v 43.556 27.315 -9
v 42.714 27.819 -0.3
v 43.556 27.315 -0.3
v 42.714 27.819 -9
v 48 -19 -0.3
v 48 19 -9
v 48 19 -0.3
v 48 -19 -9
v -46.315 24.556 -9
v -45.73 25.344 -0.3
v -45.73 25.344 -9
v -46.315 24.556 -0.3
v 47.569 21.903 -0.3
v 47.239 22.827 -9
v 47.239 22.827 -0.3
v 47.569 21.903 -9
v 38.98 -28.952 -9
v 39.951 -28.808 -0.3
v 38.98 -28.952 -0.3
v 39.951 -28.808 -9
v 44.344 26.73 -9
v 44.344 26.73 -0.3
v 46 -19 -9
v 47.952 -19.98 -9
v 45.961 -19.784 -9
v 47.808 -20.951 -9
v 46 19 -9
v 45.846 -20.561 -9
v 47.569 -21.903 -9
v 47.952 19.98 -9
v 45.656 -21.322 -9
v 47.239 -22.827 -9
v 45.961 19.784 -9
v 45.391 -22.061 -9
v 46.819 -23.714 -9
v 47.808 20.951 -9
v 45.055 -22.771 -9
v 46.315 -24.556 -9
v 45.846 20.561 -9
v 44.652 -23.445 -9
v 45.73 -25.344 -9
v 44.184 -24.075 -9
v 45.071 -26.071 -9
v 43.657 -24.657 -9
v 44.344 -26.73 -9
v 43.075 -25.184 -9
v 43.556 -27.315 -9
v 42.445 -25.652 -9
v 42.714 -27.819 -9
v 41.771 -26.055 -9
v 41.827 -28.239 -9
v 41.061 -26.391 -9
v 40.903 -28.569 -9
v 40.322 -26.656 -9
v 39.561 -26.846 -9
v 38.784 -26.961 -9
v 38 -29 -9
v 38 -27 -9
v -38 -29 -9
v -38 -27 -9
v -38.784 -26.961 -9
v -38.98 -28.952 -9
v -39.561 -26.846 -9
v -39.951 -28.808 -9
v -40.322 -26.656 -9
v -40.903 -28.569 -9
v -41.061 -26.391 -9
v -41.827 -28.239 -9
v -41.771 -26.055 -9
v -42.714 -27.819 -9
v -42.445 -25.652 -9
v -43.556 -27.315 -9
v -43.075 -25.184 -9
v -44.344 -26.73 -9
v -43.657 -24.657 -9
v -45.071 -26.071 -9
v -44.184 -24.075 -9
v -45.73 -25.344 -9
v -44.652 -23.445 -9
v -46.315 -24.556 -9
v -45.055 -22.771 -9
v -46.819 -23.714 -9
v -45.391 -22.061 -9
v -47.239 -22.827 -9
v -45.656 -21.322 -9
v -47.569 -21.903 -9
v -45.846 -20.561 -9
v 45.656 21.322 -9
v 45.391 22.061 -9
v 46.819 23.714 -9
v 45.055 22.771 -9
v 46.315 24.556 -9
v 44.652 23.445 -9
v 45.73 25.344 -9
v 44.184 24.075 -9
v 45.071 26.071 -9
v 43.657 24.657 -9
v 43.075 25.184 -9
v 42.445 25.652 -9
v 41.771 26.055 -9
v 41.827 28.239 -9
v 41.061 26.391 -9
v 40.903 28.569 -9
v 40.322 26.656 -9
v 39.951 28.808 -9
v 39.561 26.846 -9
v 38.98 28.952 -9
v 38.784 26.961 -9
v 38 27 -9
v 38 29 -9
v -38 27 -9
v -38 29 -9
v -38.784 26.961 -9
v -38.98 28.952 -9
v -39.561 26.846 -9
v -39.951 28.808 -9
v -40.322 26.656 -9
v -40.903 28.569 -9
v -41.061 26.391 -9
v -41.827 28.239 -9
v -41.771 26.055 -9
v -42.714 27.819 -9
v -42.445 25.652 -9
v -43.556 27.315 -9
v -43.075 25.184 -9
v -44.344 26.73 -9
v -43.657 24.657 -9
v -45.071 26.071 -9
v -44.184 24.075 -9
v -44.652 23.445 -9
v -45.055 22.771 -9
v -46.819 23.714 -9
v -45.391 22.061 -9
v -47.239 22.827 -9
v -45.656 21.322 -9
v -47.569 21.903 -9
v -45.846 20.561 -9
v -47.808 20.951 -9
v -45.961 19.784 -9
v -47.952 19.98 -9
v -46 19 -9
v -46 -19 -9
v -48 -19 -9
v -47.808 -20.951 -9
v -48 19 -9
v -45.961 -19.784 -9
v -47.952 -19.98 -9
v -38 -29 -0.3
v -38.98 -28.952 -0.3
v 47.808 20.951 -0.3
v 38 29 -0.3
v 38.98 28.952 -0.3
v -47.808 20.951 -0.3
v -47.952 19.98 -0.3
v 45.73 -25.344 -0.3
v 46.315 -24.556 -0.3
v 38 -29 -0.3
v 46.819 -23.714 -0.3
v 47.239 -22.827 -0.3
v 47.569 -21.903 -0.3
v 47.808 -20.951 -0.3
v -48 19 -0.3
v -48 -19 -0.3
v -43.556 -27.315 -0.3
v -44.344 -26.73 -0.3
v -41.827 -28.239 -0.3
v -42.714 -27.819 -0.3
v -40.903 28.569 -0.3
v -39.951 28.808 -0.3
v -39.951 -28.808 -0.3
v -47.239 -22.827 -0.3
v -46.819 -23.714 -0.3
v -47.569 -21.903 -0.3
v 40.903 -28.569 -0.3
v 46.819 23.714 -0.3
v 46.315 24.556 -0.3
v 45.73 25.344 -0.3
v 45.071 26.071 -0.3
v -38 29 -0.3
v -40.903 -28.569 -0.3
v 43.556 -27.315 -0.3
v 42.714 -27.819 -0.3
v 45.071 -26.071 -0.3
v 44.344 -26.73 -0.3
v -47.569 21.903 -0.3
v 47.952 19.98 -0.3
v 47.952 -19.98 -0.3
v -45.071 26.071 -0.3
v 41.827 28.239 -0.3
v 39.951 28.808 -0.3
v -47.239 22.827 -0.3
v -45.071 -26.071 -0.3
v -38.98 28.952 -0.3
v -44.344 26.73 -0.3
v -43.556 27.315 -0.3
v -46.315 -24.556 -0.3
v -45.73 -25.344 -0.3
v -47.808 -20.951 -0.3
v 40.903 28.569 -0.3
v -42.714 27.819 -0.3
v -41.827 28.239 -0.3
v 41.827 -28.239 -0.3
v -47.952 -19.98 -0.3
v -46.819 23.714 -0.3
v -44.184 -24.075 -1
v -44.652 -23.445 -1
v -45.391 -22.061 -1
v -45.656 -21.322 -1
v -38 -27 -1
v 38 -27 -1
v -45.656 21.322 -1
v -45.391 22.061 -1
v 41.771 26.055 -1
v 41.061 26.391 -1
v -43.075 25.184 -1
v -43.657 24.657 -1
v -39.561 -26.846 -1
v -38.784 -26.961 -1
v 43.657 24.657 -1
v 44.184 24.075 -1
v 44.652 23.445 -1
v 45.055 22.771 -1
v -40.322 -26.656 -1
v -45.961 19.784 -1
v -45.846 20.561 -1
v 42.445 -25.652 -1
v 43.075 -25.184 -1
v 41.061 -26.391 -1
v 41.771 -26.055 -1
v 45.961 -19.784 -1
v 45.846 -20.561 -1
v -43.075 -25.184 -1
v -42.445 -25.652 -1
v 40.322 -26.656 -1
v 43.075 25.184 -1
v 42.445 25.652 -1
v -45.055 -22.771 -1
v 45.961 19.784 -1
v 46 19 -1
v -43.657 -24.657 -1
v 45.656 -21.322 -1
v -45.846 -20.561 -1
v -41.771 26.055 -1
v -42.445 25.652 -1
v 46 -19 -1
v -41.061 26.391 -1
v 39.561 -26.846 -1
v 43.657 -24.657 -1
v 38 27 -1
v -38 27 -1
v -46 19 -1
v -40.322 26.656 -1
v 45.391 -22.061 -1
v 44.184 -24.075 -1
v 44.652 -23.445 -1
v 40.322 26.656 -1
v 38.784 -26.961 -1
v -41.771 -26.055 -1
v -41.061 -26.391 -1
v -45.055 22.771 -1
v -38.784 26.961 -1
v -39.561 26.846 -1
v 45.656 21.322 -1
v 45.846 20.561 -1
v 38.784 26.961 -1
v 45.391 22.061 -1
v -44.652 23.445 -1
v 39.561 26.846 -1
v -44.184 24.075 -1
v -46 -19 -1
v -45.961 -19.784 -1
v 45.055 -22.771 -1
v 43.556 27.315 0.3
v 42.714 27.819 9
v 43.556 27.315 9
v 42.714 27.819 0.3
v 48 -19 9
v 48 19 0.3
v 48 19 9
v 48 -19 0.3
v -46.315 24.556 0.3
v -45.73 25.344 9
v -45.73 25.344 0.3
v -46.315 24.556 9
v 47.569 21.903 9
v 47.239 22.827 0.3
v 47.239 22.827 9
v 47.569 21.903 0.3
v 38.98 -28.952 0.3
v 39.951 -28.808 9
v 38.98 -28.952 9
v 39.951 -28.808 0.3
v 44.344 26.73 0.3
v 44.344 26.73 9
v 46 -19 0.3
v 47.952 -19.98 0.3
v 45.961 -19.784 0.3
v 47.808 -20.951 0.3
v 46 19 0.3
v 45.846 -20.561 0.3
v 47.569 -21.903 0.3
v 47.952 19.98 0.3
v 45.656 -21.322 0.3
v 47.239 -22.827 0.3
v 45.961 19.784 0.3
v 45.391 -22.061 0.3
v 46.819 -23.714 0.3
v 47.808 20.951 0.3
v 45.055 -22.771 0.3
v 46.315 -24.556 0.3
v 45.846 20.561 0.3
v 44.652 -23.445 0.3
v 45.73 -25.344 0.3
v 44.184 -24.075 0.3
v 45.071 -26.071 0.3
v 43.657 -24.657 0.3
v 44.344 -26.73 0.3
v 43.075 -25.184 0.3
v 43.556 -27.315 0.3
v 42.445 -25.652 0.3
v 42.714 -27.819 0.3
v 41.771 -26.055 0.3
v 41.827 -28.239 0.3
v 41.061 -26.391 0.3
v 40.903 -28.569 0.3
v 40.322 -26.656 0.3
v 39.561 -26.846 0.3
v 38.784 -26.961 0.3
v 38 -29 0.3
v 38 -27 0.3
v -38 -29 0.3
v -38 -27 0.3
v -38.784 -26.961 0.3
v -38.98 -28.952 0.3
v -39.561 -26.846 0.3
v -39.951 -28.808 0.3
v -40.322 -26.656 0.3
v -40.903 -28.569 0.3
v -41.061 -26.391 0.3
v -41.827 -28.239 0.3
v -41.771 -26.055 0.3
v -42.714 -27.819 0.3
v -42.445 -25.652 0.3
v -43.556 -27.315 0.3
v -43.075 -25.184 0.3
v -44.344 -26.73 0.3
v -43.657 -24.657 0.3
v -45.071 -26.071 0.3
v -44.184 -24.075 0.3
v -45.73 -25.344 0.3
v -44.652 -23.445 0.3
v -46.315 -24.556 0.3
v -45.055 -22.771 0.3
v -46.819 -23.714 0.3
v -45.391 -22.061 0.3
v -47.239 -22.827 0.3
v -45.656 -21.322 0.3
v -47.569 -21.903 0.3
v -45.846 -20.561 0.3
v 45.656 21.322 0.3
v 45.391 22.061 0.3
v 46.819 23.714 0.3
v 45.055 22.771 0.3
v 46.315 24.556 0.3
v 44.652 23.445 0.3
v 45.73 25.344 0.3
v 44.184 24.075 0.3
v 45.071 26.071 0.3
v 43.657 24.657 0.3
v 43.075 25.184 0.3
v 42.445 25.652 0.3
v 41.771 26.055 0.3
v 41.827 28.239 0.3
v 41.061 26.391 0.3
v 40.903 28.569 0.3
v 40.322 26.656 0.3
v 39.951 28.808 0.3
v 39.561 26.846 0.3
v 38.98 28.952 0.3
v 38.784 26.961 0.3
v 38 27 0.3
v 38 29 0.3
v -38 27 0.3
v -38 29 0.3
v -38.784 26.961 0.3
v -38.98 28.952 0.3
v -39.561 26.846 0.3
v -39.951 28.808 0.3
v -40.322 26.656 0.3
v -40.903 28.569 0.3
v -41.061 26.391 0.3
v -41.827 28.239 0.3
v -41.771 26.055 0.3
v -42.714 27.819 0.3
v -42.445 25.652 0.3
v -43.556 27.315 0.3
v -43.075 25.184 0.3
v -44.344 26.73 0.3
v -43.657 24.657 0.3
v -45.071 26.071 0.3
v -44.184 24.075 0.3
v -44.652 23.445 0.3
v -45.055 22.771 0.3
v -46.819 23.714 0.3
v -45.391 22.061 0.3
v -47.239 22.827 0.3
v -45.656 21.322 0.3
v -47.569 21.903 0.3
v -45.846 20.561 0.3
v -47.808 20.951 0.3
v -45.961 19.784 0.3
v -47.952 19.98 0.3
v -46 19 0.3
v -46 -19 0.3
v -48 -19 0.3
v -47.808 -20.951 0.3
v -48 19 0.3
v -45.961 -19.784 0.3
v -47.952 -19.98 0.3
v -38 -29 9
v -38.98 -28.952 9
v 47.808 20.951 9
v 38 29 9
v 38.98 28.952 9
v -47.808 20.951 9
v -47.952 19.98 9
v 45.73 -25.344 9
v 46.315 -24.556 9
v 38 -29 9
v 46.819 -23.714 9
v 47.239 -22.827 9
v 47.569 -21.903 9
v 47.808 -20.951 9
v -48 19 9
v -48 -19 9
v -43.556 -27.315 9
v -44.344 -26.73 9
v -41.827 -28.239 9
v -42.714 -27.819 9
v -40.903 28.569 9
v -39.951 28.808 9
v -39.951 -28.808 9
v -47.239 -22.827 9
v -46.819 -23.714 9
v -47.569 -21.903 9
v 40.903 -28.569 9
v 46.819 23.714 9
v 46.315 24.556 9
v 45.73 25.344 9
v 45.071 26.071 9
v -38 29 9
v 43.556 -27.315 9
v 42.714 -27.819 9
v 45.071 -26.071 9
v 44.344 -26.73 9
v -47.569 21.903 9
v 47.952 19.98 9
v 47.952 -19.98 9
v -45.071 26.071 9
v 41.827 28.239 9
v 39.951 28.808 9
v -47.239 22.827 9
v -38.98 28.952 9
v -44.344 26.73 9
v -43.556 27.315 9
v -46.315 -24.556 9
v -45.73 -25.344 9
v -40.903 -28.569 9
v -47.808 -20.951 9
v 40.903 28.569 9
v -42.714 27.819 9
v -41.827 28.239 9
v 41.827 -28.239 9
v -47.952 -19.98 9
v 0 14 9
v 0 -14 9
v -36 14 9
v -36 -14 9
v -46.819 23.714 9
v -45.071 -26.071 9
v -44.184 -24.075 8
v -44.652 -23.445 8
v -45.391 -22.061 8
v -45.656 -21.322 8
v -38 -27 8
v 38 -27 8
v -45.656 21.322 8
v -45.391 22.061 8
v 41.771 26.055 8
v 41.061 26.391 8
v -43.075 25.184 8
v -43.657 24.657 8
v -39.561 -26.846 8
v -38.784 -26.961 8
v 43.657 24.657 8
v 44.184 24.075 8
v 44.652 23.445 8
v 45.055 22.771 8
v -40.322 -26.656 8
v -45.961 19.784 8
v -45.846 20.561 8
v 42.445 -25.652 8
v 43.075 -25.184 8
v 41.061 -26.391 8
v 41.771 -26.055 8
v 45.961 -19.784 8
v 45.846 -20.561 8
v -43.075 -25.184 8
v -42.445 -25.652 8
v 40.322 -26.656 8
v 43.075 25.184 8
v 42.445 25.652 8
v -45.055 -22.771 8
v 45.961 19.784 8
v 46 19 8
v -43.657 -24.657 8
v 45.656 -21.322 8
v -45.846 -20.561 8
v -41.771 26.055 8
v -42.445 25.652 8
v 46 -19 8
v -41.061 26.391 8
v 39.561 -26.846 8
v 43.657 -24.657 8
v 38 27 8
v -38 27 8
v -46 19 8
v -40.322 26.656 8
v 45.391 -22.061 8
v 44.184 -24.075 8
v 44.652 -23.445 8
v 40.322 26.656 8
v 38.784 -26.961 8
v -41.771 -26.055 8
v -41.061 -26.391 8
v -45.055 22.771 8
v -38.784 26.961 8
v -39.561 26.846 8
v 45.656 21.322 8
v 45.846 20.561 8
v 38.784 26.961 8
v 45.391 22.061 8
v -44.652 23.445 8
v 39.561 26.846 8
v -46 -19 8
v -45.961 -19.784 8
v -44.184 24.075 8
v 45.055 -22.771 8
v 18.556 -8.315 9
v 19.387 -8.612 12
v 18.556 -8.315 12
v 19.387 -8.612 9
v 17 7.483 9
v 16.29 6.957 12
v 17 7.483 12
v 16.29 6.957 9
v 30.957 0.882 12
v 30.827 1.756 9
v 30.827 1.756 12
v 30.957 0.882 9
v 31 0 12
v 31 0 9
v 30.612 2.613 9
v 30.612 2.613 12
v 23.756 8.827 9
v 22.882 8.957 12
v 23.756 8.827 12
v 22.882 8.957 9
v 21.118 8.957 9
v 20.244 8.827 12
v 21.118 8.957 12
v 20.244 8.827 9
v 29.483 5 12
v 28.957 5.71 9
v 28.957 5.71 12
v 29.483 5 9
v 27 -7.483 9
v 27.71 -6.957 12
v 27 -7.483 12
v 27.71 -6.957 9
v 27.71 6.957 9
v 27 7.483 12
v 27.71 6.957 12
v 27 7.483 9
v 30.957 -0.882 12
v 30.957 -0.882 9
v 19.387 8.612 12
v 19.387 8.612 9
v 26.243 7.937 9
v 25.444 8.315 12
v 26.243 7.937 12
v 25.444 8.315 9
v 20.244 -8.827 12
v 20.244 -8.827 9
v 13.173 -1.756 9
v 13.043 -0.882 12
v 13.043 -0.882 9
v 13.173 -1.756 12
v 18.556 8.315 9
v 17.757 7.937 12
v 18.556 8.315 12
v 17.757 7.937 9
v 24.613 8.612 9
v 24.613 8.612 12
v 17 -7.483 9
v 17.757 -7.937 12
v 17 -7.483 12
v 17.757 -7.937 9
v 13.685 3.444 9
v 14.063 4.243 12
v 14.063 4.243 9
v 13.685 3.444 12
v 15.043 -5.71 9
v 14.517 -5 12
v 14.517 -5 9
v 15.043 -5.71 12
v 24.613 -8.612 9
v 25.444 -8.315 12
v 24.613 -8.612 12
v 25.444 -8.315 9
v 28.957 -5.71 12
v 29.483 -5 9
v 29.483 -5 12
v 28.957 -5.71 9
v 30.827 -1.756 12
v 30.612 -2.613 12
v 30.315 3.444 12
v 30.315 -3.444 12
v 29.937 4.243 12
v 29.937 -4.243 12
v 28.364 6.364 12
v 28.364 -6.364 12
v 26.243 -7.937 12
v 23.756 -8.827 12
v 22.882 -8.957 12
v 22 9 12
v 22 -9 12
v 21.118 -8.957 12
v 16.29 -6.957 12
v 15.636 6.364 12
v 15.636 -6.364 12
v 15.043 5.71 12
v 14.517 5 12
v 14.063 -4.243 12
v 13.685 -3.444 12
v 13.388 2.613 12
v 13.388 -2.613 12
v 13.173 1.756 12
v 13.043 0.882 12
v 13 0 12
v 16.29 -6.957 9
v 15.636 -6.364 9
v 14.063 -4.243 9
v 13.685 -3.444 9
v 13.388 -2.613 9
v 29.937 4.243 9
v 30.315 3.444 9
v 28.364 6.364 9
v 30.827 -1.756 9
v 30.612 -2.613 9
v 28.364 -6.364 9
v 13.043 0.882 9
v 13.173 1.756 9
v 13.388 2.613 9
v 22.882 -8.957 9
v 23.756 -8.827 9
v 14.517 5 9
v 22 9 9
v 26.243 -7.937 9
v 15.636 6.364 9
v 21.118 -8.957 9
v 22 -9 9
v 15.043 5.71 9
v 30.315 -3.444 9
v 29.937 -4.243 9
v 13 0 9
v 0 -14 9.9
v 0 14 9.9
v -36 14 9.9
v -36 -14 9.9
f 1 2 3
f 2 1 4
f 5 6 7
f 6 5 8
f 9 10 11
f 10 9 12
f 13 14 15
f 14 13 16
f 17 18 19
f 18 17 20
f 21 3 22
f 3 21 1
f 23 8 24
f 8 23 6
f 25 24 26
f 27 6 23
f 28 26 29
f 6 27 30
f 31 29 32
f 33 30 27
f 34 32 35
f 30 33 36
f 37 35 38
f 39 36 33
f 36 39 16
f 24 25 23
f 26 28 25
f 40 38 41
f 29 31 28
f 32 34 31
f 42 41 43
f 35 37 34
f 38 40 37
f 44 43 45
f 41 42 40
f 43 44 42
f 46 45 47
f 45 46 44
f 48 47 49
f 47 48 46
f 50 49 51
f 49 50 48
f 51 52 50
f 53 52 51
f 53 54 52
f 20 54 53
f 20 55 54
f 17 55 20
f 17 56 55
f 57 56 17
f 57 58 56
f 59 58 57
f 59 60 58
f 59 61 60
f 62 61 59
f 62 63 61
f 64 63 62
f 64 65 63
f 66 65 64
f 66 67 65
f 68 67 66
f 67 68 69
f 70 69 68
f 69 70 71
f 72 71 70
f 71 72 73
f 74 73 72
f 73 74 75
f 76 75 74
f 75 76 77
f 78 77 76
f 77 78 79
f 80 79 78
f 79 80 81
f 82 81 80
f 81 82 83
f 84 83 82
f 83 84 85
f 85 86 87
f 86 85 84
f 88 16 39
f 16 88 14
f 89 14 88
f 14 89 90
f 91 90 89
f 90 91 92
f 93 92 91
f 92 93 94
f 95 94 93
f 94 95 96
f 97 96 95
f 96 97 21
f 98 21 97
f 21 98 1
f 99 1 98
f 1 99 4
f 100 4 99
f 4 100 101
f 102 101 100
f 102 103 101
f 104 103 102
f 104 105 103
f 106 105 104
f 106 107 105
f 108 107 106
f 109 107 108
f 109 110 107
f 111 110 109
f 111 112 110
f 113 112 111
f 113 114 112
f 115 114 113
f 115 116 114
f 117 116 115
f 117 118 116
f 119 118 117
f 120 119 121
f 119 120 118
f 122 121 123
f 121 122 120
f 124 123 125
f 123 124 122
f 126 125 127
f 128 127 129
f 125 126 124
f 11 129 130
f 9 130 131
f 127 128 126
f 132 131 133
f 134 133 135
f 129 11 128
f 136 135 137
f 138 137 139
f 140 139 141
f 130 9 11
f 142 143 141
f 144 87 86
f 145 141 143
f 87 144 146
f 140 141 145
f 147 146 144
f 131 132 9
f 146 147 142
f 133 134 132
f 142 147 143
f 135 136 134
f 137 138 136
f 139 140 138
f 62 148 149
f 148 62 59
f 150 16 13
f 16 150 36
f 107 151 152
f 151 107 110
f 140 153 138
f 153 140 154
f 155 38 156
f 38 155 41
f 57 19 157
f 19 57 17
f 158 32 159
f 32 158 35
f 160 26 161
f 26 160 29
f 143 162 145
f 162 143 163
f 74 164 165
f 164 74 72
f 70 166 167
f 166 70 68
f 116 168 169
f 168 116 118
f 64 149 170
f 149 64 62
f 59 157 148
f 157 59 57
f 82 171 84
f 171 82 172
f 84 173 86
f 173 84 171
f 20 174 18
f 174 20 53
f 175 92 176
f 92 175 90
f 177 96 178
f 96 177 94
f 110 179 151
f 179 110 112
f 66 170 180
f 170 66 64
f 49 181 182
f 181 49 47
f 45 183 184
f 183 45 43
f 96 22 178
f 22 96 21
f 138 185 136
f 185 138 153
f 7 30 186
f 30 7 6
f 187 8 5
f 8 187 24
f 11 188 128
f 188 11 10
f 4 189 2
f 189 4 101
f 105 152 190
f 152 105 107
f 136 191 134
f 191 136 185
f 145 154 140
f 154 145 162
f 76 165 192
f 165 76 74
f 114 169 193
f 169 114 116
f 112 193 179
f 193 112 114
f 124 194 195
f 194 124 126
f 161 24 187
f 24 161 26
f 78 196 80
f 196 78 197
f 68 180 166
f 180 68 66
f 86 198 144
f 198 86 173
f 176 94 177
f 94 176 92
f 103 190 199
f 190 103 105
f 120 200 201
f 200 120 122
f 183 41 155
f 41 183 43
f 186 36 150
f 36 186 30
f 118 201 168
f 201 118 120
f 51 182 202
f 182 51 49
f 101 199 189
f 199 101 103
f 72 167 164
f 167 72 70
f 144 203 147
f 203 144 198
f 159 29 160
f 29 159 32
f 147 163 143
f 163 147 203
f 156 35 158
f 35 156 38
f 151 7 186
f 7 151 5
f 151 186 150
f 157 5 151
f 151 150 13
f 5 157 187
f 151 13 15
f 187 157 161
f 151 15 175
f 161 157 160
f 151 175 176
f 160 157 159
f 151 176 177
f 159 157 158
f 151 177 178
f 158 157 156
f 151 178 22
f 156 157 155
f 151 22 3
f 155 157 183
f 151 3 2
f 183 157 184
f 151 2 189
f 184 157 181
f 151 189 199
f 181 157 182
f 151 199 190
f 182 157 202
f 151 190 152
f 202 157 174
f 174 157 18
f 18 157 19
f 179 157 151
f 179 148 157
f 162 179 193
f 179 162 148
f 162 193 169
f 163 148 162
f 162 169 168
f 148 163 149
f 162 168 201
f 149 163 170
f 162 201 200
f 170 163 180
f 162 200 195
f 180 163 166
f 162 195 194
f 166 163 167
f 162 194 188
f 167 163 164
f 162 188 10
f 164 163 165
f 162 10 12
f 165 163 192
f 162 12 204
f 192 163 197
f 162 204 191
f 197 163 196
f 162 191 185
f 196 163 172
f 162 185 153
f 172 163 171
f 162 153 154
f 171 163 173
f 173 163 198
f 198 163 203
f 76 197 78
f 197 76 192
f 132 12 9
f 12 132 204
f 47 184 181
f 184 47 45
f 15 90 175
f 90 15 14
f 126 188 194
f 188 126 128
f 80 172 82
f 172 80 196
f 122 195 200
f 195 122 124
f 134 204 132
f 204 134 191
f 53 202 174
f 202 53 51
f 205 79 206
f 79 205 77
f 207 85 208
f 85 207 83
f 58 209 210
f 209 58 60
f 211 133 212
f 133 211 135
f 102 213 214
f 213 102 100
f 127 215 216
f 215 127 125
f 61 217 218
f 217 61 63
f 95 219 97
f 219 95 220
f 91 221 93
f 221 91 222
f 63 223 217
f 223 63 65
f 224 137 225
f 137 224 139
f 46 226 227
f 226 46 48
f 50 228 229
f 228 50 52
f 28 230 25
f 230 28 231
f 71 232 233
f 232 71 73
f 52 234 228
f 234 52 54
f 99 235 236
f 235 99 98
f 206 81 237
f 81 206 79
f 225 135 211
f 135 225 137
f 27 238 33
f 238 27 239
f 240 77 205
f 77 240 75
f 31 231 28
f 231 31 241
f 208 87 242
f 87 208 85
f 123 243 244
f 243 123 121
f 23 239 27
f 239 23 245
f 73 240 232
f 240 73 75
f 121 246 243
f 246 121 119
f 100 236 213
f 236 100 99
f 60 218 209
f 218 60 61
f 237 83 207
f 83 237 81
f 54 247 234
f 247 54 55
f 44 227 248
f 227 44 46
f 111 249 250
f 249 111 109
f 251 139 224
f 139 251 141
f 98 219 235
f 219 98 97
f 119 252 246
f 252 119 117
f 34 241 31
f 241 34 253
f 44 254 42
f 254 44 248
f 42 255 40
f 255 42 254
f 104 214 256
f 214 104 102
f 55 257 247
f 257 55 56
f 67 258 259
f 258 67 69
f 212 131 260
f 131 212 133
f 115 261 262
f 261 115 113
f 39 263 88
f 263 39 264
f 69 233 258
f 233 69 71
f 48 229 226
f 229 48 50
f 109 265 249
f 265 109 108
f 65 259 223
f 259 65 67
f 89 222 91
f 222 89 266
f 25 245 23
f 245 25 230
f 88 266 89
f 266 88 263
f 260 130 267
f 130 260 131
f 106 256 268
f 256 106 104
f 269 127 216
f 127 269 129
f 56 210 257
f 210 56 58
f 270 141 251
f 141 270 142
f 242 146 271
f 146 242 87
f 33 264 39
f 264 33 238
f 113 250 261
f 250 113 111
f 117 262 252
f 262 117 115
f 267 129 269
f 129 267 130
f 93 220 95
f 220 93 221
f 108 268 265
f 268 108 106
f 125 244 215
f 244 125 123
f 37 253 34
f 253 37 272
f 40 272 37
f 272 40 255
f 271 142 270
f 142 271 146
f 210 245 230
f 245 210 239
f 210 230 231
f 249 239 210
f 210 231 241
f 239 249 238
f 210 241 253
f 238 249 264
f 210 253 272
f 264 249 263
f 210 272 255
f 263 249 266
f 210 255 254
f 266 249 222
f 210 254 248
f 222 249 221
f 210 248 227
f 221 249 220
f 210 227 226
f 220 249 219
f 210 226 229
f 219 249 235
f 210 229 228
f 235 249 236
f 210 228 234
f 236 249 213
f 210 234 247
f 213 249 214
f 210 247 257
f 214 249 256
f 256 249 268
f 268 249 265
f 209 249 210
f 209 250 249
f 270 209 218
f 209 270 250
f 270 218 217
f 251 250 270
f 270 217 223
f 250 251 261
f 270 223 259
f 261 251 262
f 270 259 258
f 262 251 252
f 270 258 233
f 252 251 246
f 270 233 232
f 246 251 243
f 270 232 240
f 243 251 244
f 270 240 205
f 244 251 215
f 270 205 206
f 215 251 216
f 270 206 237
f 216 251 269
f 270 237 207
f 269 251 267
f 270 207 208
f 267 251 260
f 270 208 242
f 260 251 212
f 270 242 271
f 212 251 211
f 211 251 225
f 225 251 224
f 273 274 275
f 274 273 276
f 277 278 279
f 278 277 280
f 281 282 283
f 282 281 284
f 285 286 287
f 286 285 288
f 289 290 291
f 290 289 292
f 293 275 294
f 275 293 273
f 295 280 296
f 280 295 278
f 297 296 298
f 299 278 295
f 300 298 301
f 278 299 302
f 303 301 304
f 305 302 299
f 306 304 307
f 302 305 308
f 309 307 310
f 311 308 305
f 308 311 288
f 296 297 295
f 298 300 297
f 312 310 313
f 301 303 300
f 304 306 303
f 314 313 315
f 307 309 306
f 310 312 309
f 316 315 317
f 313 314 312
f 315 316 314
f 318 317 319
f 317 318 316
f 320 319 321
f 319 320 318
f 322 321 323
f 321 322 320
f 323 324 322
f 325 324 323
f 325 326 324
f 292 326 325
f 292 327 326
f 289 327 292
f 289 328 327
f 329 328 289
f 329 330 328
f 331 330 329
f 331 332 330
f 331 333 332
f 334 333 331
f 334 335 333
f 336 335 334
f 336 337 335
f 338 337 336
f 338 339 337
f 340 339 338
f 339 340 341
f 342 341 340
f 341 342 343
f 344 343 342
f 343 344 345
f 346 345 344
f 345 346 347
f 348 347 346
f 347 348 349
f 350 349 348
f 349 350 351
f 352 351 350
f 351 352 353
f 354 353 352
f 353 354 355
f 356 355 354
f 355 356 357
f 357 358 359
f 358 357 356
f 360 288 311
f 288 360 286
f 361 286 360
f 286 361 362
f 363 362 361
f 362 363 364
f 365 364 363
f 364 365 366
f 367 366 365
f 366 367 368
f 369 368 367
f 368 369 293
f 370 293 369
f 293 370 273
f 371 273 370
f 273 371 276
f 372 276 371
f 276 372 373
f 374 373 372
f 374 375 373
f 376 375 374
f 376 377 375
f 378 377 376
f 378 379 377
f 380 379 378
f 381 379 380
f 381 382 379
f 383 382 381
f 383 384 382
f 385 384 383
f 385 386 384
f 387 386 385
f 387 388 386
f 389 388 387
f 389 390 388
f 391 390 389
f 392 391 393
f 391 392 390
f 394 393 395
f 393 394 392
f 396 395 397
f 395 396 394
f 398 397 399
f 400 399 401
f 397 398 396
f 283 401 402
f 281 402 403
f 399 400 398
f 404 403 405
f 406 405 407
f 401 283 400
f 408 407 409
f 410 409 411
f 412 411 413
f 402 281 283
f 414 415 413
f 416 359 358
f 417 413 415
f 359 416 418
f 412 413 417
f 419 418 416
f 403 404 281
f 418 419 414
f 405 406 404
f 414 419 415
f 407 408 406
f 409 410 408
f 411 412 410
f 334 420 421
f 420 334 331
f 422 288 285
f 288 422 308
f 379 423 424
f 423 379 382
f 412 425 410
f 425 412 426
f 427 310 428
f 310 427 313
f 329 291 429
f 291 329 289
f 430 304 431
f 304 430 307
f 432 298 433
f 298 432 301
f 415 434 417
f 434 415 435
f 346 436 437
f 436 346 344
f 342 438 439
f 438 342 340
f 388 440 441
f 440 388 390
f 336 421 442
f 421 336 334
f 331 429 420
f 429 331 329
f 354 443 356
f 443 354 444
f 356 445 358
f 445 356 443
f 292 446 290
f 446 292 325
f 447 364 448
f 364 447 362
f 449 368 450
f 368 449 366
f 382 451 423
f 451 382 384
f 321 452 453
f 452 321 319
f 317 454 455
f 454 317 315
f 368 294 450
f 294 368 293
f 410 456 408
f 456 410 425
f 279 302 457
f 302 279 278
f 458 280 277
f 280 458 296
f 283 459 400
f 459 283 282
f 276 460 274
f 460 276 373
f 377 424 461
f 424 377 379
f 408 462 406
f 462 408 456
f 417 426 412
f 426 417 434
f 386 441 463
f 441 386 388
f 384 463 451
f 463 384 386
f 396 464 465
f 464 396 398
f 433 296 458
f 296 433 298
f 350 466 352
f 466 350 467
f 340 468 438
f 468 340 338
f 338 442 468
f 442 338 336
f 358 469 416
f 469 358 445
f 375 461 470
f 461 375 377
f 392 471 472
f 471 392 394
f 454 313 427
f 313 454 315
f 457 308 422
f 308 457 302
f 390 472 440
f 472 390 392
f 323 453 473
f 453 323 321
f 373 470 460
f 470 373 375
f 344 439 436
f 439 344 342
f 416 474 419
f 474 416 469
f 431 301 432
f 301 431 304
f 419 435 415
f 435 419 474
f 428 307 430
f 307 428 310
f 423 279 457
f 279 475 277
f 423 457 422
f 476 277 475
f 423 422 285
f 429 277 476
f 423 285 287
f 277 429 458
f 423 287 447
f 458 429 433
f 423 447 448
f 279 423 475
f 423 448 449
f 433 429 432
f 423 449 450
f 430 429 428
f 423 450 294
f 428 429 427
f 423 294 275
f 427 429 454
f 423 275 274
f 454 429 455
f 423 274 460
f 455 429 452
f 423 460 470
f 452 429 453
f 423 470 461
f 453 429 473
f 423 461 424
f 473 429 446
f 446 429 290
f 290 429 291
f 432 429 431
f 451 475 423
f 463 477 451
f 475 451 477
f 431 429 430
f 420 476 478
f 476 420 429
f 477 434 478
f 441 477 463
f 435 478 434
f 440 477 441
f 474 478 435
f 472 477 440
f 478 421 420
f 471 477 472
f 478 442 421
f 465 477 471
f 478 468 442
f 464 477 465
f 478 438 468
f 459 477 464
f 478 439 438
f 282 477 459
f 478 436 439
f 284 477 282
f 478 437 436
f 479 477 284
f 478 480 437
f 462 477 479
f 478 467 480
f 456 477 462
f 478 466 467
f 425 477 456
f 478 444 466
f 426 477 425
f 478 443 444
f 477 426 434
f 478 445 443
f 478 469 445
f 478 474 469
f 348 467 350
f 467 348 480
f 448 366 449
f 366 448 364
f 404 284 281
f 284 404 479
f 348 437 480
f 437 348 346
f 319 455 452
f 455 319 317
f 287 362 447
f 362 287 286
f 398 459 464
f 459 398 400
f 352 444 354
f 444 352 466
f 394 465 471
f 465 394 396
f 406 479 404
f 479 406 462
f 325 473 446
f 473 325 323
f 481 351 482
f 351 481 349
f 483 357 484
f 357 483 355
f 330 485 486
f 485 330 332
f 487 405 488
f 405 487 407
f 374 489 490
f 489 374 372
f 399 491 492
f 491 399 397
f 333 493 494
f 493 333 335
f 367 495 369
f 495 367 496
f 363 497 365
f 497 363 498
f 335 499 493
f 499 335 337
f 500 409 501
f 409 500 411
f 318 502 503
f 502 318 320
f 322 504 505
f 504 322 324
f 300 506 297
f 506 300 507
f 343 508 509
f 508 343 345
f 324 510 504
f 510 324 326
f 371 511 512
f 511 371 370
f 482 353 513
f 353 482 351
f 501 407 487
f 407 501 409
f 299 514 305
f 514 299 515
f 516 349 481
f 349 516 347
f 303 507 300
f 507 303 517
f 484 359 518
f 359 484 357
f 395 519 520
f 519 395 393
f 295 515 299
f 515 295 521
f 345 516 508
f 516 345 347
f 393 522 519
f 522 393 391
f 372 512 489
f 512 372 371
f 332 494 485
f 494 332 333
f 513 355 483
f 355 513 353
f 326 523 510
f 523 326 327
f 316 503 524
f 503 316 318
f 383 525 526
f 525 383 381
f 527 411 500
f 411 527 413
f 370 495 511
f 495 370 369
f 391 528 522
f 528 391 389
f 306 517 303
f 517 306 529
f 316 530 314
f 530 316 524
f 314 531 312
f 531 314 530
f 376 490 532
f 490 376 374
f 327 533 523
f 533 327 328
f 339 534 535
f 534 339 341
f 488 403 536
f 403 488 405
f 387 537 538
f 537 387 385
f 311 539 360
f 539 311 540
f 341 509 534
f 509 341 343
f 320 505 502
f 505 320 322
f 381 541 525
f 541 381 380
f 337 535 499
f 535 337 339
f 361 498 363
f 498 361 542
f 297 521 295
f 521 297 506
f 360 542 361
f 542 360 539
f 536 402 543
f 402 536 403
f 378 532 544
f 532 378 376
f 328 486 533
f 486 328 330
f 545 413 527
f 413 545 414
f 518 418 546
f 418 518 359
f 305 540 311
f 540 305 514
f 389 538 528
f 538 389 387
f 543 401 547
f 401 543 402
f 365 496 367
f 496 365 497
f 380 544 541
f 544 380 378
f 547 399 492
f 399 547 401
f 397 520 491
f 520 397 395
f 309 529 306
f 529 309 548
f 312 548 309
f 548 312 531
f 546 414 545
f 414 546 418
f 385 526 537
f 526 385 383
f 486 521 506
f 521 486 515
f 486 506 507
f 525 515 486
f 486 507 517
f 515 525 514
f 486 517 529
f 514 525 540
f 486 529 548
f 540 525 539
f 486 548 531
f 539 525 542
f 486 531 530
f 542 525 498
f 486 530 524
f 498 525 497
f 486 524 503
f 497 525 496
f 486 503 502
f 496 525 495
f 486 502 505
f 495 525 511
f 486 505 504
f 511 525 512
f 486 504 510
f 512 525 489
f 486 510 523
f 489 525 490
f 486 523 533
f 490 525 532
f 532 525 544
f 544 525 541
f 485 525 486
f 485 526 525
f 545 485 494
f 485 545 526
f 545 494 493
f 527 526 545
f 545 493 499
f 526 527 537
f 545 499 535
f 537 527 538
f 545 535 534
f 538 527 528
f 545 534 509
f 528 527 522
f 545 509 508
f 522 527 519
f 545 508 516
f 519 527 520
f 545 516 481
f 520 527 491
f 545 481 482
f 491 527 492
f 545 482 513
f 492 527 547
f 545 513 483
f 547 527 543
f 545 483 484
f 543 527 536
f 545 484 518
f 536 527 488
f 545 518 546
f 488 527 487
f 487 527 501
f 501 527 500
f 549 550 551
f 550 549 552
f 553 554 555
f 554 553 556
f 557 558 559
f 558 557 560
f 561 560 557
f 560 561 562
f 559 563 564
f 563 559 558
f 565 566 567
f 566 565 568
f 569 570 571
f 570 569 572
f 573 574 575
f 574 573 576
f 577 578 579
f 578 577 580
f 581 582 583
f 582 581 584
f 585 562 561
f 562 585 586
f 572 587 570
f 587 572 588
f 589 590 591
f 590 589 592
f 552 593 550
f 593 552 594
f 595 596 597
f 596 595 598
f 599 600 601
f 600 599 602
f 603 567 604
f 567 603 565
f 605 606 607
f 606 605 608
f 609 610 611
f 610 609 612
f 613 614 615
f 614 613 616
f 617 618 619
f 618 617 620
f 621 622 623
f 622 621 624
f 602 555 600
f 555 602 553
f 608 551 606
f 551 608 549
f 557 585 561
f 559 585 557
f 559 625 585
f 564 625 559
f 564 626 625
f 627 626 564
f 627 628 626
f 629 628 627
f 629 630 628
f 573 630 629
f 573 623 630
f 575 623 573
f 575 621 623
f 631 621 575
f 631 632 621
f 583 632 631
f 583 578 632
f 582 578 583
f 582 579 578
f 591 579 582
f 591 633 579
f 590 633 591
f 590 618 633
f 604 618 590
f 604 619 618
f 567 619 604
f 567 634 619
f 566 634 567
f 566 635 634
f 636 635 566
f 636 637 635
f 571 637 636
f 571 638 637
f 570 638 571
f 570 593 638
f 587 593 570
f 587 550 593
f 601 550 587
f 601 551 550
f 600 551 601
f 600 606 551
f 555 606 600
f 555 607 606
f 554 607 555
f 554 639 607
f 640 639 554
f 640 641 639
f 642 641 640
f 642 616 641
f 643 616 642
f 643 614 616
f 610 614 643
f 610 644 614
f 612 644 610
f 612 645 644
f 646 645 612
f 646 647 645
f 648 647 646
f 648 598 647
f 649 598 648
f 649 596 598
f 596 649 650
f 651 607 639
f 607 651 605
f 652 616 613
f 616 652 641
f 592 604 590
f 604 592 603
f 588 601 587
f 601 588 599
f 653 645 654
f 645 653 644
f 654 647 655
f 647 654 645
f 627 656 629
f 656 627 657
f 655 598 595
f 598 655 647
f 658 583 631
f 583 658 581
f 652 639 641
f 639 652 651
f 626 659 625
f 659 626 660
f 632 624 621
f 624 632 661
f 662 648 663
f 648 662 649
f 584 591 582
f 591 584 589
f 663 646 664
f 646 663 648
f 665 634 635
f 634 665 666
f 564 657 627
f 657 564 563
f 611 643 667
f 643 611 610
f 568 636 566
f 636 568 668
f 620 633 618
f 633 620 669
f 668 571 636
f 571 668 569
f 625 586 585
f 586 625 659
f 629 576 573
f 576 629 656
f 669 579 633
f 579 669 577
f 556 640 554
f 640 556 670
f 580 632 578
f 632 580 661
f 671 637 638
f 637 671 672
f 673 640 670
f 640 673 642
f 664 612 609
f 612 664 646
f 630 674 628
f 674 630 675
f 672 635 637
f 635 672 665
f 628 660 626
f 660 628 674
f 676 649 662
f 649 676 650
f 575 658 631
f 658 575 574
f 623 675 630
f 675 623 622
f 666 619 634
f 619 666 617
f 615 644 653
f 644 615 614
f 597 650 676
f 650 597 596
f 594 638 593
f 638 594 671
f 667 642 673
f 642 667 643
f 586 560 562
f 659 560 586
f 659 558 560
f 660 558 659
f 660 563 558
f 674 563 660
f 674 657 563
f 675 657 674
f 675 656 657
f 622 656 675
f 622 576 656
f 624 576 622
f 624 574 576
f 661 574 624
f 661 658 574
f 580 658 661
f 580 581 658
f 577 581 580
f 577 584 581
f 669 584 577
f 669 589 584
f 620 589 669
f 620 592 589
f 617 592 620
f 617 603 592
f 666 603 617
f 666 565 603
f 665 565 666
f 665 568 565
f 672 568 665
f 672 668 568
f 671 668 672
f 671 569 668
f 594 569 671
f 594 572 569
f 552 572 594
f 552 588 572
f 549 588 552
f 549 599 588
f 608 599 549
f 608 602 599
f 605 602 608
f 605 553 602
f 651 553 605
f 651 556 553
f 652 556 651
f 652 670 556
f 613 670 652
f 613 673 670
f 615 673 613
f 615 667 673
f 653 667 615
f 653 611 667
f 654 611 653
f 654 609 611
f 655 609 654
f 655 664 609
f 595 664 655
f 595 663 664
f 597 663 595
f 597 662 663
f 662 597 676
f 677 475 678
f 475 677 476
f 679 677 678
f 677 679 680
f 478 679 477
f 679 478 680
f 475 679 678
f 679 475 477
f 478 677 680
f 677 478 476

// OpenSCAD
$fn=64;
// OLEANDER Practice 2026-08-15
// Exercise assumptions only; not production dimensions.
body_w=96; body_d=58; body_h=18; corner_r=10;
button_d=18; button_h=3;
variant = is_undef(variant) ? 2 : variant;
seam = variant==1 ? 0.2 : variant==2 ? 0.6 : 1.2;

module rounded_box(w,d,h,r){
  hull(){
    for(x=[-w/2+r,w/2-r]) for(y=[-d/2+r,d/2-r])
      translate([x,y,0]) cylinder(h=h,r=r);
  }
}
module top_shell(){
  difference(){
    translate([0,0,seam/2]) rounded_box(body_w,body_d,body_h/2-seam/2,corner_r);
    translate([0,0,-1]) rounded_box(body_w-4,body_d-4,body_h/2,corner_r-2);
  }
}
module bottom_shell(){
  difference(){
    translate([0,0,-body_h/2]) rounded_box(body_w,body_d,body_h/2-seam/2,corner_r);
    translate([0,0,-body_h/2-1]) rounded_box(body_w-4,body_d-4,body_h/2,corner_r-2);
  }
}
module button(){
  translate([22,0,body_h/2+button_h/2]) cylinder(h=button_h,d=button_d,center=true);
}
module display_recess(){
  translate([-18,0,body_h/2+0.4]) cube([36,28,1],center=true);
}
color([0.86,0.86,0.86]) bottom_shell();
color([0.94,0.94,0.94]) top_shell();
color([0.2,0.2,0.2]) button();
color([0.15,0.15,0.15]) display_recess();
